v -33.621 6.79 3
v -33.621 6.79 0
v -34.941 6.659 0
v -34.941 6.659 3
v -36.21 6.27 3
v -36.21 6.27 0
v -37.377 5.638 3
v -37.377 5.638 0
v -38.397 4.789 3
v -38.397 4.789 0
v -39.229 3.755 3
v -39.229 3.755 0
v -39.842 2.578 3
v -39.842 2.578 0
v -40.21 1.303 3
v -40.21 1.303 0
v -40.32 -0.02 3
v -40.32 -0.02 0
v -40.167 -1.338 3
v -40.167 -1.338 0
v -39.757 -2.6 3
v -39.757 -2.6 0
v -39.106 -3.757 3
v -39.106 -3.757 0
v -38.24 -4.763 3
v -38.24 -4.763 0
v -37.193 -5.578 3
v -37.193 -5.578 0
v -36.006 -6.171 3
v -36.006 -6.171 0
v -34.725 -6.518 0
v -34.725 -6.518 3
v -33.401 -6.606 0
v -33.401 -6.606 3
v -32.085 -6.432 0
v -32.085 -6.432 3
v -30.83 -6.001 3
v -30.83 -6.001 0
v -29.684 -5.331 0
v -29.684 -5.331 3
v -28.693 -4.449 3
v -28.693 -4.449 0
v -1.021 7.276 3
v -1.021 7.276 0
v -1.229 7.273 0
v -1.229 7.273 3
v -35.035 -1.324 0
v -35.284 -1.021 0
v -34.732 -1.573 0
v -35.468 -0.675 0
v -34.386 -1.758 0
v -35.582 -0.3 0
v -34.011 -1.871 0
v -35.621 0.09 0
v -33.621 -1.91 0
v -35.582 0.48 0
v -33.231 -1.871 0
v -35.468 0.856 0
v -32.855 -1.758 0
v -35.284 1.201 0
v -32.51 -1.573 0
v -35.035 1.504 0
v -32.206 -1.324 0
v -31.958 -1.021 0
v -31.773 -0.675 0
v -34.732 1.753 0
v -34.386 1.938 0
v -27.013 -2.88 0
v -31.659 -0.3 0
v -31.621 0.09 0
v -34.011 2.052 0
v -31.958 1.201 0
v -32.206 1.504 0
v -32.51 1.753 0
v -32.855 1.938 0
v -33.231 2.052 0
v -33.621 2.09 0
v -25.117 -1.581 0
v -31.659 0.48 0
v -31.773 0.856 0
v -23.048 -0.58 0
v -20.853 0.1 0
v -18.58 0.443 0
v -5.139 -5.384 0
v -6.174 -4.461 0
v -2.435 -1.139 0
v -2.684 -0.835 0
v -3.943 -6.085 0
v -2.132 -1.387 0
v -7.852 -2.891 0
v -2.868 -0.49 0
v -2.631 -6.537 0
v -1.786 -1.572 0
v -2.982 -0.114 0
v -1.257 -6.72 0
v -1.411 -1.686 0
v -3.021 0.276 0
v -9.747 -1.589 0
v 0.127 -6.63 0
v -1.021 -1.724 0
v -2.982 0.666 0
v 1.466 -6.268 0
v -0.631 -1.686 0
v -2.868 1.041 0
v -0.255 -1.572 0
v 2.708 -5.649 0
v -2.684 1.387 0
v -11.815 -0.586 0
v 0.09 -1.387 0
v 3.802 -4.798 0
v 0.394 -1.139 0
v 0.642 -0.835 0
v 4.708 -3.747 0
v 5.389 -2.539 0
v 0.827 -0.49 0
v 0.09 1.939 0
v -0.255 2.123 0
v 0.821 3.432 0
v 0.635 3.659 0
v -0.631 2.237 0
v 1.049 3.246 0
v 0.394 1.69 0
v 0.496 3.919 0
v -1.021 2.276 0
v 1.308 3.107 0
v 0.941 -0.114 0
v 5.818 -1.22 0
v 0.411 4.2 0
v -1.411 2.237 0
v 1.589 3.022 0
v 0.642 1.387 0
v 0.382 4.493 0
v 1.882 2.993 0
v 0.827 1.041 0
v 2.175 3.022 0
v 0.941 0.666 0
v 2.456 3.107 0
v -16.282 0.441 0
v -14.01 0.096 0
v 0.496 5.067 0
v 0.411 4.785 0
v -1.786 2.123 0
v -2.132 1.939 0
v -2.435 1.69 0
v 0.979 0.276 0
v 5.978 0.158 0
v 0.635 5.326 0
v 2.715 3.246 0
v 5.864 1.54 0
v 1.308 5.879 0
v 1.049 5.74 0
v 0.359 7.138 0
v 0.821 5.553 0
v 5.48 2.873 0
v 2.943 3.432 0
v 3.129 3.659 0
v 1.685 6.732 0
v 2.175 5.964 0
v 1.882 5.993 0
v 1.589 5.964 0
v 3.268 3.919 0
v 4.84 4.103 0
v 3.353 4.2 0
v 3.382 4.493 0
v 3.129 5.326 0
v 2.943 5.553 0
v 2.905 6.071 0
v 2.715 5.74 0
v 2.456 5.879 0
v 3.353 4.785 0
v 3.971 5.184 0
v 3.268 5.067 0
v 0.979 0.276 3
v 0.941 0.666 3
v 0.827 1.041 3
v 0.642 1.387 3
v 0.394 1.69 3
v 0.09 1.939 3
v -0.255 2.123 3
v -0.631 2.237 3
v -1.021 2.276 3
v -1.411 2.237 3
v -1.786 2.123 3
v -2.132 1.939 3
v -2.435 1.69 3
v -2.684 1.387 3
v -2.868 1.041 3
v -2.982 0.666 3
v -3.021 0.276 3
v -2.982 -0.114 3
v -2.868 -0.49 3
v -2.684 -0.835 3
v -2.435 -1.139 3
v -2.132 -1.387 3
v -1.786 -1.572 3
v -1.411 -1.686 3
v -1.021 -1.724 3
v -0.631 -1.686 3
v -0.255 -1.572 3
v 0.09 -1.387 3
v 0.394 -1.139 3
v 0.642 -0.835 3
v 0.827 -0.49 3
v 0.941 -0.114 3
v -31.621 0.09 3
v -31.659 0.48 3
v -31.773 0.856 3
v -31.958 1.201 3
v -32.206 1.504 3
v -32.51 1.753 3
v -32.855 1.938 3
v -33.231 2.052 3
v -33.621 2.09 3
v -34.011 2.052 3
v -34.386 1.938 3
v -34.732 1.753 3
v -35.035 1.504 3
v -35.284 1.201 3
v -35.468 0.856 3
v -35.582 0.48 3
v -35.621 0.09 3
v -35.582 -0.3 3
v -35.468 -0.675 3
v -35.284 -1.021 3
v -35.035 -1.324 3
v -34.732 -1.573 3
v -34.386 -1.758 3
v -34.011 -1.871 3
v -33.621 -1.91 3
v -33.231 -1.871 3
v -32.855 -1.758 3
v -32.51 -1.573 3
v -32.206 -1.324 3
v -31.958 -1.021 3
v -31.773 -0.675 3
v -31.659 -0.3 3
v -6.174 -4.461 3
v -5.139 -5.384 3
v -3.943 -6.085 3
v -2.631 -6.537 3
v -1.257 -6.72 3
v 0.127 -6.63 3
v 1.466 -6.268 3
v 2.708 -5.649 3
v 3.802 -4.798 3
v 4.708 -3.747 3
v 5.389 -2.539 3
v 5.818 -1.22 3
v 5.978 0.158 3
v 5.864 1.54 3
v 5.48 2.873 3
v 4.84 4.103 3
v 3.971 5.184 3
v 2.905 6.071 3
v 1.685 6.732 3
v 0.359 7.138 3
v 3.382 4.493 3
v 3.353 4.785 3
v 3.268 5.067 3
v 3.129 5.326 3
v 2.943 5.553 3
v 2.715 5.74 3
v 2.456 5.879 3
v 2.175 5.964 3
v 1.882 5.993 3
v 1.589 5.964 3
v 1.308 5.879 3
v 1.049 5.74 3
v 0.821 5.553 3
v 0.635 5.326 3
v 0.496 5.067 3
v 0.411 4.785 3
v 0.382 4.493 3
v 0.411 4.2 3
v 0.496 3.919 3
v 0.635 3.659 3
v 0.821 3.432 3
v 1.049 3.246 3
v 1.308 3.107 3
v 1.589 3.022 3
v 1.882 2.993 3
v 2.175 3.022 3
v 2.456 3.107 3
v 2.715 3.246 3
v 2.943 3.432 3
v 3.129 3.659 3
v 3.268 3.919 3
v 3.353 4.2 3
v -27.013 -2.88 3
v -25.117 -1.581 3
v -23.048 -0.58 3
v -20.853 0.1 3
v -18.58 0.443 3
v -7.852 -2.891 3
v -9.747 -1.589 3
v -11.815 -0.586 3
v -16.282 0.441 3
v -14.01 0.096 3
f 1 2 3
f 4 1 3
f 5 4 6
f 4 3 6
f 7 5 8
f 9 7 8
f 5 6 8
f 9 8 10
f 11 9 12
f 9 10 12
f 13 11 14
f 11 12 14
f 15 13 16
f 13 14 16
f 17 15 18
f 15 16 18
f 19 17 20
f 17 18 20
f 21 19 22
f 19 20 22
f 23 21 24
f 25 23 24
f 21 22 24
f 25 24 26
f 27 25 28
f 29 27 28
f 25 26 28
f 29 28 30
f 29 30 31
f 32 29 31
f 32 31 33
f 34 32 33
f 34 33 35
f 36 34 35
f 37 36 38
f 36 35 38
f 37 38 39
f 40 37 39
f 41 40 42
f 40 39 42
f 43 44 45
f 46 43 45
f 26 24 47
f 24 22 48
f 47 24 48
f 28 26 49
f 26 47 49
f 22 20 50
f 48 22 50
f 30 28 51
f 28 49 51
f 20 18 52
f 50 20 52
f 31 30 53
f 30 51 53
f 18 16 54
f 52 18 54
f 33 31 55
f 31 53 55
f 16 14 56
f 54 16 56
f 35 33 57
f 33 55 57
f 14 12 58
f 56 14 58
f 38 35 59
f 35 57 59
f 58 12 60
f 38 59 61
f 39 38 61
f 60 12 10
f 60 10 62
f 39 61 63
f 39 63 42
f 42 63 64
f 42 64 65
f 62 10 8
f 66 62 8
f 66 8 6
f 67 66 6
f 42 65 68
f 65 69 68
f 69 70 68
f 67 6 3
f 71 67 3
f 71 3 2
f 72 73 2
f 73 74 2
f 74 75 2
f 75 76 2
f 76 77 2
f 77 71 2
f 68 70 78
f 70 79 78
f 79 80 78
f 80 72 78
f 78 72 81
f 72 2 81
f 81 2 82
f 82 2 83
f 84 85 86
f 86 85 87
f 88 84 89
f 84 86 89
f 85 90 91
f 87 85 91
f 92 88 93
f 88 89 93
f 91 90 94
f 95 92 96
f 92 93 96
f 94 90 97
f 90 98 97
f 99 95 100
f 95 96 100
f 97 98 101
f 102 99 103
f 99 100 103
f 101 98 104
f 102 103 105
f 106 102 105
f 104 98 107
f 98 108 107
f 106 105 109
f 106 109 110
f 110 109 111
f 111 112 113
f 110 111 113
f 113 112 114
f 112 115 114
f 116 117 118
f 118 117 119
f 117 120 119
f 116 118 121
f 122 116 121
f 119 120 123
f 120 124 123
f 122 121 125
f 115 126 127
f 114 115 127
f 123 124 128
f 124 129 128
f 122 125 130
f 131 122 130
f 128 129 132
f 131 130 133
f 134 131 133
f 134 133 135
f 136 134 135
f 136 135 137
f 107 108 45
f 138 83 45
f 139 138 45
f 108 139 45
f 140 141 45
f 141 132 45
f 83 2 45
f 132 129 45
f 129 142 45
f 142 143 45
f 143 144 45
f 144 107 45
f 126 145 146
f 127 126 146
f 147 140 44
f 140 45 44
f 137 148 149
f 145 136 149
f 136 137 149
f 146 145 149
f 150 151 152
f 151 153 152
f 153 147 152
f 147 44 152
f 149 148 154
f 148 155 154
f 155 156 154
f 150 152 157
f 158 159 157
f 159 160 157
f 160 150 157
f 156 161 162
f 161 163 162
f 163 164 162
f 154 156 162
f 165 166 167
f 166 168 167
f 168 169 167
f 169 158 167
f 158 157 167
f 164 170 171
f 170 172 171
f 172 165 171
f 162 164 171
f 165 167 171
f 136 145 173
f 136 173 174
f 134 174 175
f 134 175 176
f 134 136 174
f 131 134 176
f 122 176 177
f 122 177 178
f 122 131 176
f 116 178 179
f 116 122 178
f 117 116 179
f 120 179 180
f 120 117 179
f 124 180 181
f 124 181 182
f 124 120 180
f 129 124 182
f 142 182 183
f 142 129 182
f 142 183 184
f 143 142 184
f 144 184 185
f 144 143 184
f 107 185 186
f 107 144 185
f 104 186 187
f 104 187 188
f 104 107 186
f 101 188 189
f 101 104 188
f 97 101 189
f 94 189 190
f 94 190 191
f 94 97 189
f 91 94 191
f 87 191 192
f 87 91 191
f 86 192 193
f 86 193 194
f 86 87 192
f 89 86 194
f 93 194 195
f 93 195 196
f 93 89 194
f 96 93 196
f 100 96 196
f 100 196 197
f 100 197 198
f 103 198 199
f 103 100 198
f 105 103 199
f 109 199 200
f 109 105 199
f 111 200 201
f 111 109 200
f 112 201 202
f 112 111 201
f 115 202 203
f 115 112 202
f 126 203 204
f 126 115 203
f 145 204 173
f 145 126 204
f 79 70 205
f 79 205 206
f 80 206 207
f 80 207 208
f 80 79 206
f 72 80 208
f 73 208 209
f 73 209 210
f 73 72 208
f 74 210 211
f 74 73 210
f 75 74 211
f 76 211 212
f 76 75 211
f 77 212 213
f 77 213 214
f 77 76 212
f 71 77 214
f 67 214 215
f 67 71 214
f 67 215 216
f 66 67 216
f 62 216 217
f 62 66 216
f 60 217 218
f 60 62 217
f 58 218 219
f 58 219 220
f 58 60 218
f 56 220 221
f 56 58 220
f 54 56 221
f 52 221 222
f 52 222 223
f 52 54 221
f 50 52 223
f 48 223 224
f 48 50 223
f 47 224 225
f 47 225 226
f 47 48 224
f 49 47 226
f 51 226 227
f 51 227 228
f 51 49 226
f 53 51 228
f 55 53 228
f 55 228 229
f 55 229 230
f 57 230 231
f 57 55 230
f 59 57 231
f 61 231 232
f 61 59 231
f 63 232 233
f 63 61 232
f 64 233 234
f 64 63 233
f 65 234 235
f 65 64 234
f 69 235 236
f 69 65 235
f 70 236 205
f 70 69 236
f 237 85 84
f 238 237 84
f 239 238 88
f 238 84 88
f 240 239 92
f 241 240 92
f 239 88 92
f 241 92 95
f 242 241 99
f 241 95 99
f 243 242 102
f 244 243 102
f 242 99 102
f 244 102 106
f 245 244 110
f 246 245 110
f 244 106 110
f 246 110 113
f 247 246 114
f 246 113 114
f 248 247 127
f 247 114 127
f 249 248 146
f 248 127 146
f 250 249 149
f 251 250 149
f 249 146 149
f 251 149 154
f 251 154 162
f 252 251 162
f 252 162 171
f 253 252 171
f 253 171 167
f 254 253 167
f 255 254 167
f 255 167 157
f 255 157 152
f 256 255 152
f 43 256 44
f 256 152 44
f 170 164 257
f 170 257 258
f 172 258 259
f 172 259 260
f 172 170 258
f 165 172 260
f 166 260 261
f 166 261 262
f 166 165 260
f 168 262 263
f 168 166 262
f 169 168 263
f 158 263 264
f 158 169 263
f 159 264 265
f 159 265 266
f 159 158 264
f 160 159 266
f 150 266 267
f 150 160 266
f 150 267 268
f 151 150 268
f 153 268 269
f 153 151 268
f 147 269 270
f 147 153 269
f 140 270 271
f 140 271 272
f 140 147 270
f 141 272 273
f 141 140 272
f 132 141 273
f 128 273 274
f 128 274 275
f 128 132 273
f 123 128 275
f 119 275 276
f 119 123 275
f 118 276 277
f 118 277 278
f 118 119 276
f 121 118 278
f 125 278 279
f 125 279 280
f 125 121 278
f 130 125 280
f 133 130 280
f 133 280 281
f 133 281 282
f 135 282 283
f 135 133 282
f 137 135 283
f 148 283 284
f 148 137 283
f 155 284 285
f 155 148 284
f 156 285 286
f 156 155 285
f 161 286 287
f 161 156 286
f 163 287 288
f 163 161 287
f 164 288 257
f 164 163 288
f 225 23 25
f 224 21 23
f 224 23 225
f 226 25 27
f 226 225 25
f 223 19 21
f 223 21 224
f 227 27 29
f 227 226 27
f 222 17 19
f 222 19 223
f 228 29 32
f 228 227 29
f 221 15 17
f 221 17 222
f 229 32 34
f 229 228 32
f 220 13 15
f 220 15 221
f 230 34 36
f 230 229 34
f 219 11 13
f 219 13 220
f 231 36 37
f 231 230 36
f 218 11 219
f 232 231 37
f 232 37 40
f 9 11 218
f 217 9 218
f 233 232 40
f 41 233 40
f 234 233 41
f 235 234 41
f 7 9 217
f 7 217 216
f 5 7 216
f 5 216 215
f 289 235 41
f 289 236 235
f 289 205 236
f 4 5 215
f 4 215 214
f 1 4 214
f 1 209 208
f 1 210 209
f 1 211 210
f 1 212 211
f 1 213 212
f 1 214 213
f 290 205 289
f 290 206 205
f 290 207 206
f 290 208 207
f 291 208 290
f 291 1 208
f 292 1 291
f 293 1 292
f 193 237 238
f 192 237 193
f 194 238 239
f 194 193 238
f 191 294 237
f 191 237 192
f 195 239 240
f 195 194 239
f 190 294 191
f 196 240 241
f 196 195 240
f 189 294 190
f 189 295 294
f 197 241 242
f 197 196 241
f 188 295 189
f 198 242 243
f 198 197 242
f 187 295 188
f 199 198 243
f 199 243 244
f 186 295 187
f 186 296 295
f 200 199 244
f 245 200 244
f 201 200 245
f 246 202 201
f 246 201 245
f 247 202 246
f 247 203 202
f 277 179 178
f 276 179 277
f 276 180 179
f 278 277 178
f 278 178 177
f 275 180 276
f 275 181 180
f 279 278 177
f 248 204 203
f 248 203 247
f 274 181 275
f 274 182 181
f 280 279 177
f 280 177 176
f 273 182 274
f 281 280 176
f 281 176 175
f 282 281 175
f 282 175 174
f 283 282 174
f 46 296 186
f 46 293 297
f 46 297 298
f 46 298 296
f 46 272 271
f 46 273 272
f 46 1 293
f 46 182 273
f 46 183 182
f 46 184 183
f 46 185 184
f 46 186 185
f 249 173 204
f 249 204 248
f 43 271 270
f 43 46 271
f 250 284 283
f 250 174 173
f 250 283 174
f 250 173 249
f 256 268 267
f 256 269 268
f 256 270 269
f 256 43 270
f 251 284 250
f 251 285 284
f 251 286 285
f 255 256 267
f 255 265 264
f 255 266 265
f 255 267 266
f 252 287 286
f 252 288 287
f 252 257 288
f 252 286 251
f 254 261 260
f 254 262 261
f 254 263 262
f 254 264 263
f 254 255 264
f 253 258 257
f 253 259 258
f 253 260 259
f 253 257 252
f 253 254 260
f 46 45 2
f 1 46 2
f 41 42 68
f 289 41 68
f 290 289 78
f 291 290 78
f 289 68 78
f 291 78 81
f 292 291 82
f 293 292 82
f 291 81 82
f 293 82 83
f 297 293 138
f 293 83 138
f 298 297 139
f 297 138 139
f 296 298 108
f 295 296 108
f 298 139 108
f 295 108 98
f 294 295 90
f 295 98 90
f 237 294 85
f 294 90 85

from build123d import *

# Parameters (mm, degrees)
SKETCH1_R           = 2
SKETCH1_R_2         = 1.5
BOSS_EXTRUDE1_DEPTH = 3


with BuildPart() as part:
    # Sketch1 → Boss-Extrude1 (new body)
    with BuildSketch(Plane.XY):
        with BuildLine():
            Line((-1.2291645, 7.272594351), (-33.6207003, 6.790167677))
            ThreePointArc((-33.6207003, 6.790167677), (-39.756779375, -2.600284623), (-28.692691922, -4.44907603))
            ThreePointArc((-28.692691922, -4.44907603), (-17.430920536, 0.485186112), (-6.174483245, -4.461232505))
            ThreePointArc((-6.174483245, -4.461232505), (5.388610173, -2.538681661), (-1.0207003, 7.275699134))
            Line((-1.0207003, 7.275699134), (-1.2291645, 7.272594351))
        make_face()
        with Locations((-33.6207003, 0.090167677)):
            Circle(SKETCH1_R, mode=Mode.SUBTRACT)
        with Locations((-1.0207003, 0.275699134)):
            Circle(SKETCH1_R, mode=Mode.SUBTRACT)
        with Locations((1.881986284, 4.492783471)):
            Circle(SKETCH1_R_2, mode=Mode.SUBTRACT)
    extrude(amount=BOSS_EXTRUDE1_DEPTH)


solid = part.part
